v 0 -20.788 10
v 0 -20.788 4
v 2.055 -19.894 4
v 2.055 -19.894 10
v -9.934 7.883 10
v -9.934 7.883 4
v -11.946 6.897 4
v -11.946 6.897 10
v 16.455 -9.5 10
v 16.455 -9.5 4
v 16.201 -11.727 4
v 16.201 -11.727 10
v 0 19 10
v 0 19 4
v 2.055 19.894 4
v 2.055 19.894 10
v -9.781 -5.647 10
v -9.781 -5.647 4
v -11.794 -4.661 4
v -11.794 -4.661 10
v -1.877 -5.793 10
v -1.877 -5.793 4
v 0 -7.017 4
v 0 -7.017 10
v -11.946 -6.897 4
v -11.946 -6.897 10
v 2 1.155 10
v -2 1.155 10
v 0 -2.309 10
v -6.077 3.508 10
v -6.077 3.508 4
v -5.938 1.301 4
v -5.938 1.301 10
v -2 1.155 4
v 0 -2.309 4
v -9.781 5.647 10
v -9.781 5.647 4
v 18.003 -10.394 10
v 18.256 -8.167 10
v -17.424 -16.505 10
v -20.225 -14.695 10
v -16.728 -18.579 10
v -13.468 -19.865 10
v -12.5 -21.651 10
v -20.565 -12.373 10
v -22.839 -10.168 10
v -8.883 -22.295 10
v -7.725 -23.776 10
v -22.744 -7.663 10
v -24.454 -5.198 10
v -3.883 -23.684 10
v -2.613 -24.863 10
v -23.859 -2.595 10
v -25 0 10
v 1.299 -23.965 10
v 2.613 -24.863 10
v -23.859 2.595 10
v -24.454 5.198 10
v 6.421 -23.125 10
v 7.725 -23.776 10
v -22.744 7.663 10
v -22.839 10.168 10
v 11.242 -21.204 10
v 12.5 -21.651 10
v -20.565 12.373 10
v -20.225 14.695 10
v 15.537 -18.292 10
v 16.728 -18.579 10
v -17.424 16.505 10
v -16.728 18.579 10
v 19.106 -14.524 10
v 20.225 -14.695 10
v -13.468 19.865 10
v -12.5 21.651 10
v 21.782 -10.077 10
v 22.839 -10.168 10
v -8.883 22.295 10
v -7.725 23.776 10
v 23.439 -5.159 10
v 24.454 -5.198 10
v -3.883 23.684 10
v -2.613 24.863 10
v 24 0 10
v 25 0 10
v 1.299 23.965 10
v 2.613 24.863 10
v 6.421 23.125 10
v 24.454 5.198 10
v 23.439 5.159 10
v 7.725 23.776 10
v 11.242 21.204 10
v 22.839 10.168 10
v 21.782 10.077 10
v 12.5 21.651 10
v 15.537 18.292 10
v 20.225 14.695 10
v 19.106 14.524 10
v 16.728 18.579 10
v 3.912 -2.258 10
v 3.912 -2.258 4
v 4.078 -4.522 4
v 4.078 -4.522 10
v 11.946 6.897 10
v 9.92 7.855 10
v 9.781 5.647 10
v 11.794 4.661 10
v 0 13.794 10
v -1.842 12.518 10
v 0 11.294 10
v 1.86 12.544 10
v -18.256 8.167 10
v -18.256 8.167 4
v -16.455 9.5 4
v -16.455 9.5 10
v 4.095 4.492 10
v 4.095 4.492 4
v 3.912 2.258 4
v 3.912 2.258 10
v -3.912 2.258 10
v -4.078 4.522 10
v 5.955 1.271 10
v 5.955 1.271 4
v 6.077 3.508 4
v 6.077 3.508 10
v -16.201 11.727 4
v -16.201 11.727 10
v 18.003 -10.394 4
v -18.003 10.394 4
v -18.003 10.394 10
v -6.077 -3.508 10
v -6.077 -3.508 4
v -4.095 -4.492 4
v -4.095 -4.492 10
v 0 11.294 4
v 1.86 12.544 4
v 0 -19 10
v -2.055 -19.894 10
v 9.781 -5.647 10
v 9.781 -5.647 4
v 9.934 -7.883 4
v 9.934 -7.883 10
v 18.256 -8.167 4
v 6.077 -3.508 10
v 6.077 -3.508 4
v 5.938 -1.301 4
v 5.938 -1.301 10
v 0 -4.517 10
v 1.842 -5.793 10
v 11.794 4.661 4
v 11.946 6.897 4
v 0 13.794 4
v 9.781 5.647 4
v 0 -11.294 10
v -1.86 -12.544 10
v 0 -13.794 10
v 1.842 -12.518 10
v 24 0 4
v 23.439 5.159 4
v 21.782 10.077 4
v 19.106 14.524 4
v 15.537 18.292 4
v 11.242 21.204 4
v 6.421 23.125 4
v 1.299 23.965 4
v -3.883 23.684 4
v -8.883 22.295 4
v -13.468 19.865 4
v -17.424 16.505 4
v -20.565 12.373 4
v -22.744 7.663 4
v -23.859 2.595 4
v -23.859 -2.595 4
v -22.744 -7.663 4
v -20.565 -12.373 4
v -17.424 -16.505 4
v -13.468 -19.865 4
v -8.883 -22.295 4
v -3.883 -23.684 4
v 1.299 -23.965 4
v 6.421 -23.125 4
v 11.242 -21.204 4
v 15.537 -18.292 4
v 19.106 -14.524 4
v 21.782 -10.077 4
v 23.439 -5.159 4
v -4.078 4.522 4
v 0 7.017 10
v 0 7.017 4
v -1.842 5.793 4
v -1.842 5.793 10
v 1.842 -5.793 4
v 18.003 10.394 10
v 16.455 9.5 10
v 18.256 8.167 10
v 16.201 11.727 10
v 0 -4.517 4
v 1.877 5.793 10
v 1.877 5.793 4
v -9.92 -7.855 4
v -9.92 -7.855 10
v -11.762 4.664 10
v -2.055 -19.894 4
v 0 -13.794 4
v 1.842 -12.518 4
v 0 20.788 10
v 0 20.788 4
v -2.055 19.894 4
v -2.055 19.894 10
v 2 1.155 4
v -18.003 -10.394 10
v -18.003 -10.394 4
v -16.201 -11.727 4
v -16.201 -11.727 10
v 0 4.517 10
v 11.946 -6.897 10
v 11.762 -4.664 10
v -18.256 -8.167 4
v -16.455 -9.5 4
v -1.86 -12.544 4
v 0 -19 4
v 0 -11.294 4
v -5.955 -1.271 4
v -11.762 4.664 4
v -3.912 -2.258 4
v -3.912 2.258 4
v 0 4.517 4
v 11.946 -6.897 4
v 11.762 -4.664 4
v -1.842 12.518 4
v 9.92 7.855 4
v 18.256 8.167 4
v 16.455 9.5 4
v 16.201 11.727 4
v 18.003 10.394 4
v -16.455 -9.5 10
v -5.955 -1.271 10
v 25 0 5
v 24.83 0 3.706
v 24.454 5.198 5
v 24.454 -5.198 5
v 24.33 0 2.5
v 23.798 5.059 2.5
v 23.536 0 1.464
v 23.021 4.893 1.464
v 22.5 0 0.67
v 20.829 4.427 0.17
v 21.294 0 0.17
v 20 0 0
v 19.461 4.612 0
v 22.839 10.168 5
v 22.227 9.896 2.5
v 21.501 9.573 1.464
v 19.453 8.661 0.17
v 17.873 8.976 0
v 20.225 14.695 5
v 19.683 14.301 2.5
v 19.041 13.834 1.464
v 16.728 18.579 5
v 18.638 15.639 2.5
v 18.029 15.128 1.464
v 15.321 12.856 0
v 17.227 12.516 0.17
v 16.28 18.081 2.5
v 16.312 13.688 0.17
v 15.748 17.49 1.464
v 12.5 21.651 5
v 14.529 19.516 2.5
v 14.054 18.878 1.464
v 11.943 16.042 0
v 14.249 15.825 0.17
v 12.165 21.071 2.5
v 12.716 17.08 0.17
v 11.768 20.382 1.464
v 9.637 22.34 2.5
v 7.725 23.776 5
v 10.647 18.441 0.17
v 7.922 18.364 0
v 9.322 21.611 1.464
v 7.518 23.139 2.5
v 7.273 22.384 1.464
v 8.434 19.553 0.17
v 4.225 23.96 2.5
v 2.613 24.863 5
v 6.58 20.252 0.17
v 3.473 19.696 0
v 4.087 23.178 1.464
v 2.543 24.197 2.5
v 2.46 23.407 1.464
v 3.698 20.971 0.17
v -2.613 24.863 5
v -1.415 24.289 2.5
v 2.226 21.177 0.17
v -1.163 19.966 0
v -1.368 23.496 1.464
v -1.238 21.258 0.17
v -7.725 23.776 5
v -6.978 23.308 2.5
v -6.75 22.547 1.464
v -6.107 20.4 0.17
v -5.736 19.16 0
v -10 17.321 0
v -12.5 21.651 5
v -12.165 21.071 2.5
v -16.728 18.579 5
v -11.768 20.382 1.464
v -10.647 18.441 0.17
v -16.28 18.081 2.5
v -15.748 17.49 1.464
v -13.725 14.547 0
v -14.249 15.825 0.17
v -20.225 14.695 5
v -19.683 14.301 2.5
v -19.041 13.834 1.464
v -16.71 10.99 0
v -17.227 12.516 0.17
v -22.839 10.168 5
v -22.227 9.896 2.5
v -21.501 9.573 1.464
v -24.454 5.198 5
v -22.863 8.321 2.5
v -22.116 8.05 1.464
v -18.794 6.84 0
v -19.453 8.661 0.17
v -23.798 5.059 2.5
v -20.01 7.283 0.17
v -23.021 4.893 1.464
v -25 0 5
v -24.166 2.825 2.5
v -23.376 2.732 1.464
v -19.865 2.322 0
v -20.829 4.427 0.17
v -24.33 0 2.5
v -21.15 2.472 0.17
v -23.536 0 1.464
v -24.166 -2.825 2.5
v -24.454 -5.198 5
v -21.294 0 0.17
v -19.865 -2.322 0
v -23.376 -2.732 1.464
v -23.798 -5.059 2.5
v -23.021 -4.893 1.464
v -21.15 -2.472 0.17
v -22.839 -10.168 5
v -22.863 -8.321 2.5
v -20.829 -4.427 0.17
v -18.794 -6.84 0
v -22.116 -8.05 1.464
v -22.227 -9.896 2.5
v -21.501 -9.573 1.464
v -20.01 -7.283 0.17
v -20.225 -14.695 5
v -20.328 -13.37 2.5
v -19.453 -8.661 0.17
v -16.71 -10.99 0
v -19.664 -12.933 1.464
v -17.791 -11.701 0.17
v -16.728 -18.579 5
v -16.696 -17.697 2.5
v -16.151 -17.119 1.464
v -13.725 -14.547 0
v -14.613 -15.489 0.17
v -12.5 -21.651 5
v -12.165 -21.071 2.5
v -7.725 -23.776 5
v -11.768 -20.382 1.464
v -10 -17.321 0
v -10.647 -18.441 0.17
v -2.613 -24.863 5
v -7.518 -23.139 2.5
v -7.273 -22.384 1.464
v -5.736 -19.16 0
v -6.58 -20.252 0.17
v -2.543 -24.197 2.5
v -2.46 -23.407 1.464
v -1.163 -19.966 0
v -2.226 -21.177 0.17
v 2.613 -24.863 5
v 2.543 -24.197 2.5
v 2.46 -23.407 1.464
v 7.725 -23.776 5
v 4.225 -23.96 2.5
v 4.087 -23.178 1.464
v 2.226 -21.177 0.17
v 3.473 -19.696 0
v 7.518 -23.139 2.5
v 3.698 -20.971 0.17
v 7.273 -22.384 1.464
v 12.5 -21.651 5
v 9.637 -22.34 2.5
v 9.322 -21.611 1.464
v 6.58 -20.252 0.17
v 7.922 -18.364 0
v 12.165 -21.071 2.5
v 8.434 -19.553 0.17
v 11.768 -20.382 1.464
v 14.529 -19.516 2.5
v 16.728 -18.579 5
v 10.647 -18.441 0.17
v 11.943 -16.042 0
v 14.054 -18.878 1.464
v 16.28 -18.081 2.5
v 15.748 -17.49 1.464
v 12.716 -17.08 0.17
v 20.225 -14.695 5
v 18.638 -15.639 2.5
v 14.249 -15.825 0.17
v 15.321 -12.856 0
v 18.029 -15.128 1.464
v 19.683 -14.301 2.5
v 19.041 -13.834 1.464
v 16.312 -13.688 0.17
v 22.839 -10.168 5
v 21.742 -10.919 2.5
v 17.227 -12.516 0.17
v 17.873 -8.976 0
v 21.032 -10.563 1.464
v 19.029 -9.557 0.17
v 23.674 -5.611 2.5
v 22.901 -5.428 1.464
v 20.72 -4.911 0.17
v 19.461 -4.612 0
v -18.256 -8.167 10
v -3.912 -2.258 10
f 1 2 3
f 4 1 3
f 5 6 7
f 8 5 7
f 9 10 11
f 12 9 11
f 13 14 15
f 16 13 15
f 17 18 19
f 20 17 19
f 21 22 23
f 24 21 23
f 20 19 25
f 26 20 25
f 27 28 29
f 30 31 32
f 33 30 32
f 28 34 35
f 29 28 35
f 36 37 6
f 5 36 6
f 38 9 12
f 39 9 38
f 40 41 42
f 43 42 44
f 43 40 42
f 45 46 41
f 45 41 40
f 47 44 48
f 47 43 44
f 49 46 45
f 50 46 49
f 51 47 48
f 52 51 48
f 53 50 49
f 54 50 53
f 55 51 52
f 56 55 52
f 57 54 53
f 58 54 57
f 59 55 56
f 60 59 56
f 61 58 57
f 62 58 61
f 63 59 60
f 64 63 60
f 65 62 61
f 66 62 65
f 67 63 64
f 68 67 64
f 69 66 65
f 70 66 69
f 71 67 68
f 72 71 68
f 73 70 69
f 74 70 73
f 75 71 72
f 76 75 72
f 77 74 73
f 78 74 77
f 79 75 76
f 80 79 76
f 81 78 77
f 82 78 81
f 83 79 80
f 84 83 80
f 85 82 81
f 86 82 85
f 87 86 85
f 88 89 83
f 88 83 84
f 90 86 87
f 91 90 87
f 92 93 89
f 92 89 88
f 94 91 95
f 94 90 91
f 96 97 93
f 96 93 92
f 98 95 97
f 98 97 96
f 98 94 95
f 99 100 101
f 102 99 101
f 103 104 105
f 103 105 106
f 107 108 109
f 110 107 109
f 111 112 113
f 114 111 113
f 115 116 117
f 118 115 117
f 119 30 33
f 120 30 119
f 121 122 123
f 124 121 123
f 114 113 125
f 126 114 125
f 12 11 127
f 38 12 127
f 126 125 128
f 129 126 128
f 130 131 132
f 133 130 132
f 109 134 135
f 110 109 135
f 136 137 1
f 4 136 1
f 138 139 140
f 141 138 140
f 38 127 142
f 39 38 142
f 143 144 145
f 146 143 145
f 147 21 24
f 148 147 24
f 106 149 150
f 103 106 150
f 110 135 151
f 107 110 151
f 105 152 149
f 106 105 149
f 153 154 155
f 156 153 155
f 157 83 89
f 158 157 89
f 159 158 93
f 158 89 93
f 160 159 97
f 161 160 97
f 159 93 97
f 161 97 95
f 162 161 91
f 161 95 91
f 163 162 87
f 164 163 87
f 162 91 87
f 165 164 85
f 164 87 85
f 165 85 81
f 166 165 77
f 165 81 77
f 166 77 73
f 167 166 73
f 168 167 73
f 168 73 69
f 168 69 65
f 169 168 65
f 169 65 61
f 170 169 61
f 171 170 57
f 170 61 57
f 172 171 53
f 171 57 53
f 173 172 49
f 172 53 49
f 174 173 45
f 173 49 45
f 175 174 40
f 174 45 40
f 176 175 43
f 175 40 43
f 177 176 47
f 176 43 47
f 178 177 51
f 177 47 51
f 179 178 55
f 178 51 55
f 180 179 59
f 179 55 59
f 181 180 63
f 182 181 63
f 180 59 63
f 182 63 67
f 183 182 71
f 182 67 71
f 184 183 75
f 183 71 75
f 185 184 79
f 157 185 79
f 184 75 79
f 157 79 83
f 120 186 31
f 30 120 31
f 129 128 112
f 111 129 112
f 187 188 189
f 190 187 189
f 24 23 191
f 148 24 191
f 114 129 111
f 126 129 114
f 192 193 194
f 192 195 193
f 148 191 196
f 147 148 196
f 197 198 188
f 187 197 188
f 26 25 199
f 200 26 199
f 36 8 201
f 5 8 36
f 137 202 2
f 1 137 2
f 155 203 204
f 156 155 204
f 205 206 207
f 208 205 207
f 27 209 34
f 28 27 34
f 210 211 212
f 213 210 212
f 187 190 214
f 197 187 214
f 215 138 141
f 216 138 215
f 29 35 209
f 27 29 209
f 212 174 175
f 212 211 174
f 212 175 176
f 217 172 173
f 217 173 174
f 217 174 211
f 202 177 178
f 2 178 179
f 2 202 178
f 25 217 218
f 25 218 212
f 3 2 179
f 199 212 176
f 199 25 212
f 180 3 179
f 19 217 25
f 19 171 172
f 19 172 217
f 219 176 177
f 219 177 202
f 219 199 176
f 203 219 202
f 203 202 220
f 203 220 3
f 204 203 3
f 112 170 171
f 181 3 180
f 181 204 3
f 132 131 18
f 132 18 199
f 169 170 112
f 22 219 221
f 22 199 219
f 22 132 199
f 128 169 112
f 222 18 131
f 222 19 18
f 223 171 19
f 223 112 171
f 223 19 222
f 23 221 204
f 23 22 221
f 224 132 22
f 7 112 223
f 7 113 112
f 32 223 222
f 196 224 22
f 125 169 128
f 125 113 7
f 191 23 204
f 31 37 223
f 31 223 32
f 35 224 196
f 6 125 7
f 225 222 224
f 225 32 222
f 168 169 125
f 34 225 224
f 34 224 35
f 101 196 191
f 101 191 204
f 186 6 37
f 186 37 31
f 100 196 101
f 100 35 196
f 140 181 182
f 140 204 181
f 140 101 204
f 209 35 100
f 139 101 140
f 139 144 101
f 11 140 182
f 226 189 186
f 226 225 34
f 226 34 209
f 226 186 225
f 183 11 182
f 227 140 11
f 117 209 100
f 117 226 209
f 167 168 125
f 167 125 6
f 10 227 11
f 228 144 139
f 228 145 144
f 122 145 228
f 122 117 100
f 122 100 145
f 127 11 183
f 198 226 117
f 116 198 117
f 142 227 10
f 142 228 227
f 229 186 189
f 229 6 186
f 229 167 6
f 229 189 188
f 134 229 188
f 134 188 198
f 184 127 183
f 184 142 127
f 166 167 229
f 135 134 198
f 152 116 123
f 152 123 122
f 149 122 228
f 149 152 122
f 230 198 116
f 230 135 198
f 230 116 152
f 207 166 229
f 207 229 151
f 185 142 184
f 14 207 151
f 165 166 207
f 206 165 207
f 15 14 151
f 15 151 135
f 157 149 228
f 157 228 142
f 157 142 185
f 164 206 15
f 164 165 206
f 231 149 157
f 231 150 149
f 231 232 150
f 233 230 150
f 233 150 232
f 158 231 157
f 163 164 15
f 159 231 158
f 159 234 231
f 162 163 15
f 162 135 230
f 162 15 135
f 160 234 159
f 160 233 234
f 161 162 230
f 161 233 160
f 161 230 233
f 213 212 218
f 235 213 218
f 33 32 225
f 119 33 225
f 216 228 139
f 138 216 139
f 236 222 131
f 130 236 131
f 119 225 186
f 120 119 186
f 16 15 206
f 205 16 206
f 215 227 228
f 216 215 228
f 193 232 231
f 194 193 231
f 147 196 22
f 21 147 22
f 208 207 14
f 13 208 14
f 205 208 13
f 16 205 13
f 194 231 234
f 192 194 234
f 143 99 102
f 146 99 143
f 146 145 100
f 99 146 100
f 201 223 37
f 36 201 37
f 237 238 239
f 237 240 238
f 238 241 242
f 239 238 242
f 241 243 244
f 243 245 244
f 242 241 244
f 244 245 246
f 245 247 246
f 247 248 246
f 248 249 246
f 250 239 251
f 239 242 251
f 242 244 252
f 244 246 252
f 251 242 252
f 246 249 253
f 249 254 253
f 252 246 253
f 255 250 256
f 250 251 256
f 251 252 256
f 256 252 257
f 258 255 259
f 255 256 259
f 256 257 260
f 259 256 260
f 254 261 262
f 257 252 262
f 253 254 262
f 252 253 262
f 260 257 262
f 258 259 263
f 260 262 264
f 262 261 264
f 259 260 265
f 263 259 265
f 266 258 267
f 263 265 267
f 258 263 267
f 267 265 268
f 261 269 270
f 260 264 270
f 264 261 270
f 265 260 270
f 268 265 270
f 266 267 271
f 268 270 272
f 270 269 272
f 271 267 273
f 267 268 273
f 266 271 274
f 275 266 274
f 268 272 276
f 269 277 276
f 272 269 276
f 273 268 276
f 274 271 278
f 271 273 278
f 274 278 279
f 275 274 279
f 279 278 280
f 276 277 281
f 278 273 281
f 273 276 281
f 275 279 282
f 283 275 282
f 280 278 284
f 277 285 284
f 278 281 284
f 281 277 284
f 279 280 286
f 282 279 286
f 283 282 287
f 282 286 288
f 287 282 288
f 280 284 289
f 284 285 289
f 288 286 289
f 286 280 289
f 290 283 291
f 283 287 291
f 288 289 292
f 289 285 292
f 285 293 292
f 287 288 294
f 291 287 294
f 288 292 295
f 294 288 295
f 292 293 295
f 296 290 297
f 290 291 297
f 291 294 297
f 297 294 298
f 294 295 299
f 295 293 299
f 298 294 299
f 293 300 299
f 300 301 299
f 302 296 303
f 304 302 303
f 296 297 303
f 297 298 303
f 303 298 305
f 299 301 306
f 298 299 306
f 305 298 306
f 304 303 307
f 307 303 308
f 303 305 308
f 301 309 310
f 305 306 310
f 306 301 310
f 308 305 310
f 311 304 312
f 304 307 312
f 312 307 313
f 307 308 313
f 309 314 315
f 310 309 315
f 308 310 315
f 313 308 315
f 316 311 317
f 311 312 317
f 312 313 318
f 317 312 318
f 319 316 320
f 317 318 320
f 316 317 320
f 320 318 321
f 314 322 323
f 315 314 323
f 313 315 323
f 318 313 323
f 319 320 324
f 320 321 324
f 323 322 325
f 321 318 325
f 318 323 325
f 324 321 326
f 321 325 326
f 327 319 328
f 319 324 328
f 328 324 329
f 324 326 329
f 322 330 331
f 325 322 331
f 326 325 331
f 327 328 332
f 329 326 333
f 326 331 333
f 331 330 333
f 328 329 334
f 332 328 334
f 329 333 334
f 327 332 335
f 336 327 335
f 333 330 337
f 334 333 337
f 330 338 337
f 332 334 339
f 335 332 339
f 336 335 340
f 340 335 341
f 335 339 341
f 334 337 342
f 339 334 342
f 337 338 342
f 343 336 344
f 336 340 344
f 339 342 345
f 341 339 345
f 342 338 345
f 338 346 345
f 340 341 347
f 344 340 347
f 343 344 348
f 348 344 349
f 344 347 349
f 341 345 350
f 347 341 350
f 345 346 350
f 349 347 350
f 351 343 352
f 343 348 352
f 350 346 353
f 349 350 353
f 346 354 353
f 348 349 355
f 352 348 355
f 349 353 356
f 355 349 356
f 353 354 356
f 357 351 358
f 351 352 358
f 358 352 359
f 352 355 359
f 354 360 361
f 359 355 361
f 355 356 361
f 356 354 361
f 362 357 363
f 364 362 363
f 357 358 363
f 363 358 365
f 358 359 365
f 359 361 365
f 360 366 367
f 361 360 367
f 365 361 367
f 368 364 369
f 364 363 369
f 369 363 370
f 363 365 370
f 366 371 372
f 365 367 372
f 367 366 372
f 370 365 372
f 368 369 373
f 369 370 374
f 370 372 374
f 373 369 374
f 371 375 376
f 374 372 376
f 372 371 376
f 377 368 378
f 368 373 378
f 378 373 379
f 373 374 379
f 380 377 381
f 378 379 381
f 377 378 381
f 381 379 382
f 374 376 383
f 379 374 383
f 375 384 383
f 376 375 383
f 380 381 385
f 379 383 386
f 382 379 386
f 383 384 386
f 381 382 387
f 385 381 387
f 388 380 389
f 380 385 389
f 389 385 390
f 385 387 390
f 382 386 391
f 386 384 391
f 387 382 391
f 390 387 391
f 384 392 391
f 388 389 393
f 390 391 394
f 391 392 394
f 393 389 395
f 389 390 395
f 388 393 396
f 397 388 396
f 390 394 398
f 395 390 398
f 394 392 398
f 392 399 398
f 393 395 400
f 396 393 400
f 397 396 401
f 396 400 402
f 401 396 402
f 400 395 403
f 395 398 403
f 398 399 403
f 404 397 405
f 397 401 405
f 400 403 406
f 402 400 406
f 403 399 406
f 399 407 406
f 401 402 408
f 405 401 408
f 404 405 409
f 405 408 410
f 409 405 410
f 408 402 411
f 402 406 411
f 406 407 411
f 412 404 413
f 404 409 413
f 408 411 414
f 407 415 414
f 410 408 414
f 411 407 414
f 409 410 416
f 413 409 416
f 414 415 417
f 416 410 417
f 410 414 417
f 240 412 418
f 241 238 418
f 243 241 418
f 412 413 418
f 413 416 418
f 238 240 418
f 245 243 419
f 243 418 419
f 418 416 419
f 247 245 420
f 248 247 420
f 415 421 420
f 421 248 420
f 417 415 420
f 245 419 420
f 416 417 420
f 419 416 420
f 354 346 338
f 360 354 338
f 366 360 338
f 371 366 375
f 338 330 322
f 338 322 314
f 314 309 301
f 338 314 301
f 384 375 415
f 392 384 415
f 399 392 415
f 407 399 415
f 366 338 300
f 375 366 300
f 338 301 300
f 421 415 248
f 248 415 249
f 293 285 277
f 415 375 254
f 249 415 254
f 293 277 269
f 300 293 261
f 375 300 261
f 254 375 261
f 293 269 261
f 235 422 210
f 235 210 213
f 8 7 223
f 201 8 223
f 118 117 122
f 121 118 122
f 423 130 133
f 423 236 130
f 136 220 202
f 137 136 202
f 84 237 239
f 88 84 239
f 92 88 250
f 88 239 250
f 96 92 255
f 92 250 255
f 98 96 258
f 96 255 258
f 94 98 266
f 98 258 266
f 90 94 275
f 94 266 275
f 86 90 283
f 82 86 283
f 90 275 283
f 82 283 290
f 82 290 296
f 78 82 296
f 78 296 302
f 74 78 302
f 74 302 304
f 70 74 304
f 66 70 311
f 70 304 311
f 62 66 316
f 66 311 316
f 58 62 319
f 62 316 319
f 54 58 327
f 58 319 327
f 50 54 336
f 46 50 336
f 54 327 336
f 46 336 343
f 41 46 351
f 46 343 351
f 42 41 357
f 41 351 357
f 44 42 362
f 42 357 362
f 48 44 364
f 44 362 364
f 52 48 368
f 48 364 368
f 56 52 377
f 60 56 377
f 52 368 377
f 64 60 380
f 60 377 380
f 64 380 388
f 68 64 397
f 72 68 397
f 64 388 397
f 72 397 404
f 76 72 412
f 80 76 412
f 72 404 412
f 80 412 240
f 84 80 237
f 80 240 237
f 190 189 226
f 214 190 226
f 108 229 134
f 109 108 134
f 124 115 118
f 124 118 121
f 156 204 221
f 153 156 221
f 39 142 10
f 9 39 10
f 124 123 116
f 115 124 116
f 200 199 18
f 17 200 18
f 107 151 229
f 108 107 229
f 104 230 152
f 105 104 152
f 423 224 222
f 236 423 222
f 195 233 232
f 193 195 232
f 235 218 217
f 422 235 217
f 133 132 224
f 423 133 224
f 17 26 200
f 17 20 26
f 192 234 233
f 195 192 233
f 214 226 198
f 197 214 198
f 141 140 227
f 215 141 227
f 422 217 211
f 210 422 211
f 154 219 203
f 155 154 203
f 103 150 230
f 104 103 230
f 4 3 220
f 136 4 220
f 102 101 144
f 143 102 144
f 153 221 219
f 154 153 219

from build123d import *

# Parameters (mm, degrees)
F0_R     = 25
F1_DEPTH = 10
F2_R     = 24
F3_DEPTH = 6
F5_DEPTH = 6
F7_DEPTH = 6
F9_DEPTH = 6
F10_R    = 5


with BuildPart() as f1:
    # F0 (on Top) → F1 (new body)
    with BuildSketch(Plane.XY):
        Circle(F0_R)
    extrude(amount=F1_DEPTH)

    # F2 (on face) → F3 (cut)
    with BuildSketch(Plane.XY.offset(10)):
        Circle(F2_R)
    extrude(amount=-F3_DEPTH, mode=Mode.SUBTRACT)

    # F4 (on face) → F5 (join)
    with BuildSketch(Plane.XY.offset(4)):
        Polygon((2, 1.154701), (-2, 1.154701), (0, -2.309401), align=None)
    extrude(amount=F5_DEPTH)

    # F6 (on face) → F7 (join)
    with BuildSketch(Plane.XY.offset(4)):
        Polygon((0, 19.000366), (2.05507, 19.894137), (0, 20.787908), (-2.05507, 19.894137), align=None)
        Polygon((16.4548, 9.500183), (18.256363, 8.167325), (18.002856, 10.393954), (16.201293, 11.726812), align=None)
        Polygon((16.4548, -9.500183), (16.201293, -11.726812), (18.002856, -10.393954), (18.256363, -8.167325), align=None)
        Polygon((0, -19.000366), (-2.05507, -19.894137), (0, -20.787908), (2.05507, -19.894137), align=None)
        Polygon((-16.4548, -9.500183), (-18.256363, -8.167325), (-18.002856, -10.393954), (-16.201293, -11.726812), align=None)
        Polygon((-16.4548, 9.500183), (-16.201293, 11.726812), (-18.002856, 10.393954), (-18.256363, 8.167325), align=None)
    extrude(amount=F7_DEPTH)

    # F8 (on face) → F9 (join)
    with BuildSketch(Plane.XY.offset(4)):
        Polygon((0, -13.794267), (1.842263, -12.518255), (0, -11.294267), (-1.860011, -12.544267), align=None)
        Polygon((0, -7.016653), (1.842263, -5.792665), (0, -4.516653), (-1.877231, -5.792665), align=None)
        Polygon((6.0766, -3.508326), (5.937727, -1.300886), (3.911536, -2.258326), (4.07798, -4.522062), align=None)
        Polygon((11.946186, -6.897134), (11.762258, -4.663681), (9.781122, -5.647134), (9.933649, -7.88295), align=None)
        Polygon((6.0766, 3.508326), (4.095464, 4.491779), (3.911536, 2.258326), (5.955211, 1.270603), align=None)
        Polygon((1.877231, 5.792665), (0, 7.016653), (-1.842263, 5.792665), (0, 4.516653), align=None)
        Polygon((-6.0766, 3.508326), (-5.937727, 1.300886), (-3.911536, 2.258326), (-4.07798, 4.522062), align=None)
        Polygon((-6.0766, -3.508326), (-4.095464, -4.491779), (-3.911536, -2.258326), (-5.955211, -1.270603), align=None)
        Polygon((-11.946186, -6.897134), (-9.919995, -7.854574), (-9.781122, -5.647134), (-11.79366, -4.661317), align=None)
        Polygon((-11.946186, 6.897134), (-11.762258, 4.663681), (-9.781122, 5.647134), (-9.933649, 7.88295), align=None)
        Polygon((0, 11.294267), (1.860011, 12.544267), (0, 13.794267), (-1.842263, 12.518255), align=None)
        Polygon((11.946186, 6.897134), (9.919995, 7.854574), (9.781122, 5.647134), (11.79366, 4.661317), align=None)
    extrude(amount=F9_DEPTH)

    # F10
    f10_edges = [f1.edges().sort_by_distance(p)[0] for p in [
        (-25, 0, 0),
    ]]
    fillet(f10_edges, radius=F10_R)


solid = f1.part
